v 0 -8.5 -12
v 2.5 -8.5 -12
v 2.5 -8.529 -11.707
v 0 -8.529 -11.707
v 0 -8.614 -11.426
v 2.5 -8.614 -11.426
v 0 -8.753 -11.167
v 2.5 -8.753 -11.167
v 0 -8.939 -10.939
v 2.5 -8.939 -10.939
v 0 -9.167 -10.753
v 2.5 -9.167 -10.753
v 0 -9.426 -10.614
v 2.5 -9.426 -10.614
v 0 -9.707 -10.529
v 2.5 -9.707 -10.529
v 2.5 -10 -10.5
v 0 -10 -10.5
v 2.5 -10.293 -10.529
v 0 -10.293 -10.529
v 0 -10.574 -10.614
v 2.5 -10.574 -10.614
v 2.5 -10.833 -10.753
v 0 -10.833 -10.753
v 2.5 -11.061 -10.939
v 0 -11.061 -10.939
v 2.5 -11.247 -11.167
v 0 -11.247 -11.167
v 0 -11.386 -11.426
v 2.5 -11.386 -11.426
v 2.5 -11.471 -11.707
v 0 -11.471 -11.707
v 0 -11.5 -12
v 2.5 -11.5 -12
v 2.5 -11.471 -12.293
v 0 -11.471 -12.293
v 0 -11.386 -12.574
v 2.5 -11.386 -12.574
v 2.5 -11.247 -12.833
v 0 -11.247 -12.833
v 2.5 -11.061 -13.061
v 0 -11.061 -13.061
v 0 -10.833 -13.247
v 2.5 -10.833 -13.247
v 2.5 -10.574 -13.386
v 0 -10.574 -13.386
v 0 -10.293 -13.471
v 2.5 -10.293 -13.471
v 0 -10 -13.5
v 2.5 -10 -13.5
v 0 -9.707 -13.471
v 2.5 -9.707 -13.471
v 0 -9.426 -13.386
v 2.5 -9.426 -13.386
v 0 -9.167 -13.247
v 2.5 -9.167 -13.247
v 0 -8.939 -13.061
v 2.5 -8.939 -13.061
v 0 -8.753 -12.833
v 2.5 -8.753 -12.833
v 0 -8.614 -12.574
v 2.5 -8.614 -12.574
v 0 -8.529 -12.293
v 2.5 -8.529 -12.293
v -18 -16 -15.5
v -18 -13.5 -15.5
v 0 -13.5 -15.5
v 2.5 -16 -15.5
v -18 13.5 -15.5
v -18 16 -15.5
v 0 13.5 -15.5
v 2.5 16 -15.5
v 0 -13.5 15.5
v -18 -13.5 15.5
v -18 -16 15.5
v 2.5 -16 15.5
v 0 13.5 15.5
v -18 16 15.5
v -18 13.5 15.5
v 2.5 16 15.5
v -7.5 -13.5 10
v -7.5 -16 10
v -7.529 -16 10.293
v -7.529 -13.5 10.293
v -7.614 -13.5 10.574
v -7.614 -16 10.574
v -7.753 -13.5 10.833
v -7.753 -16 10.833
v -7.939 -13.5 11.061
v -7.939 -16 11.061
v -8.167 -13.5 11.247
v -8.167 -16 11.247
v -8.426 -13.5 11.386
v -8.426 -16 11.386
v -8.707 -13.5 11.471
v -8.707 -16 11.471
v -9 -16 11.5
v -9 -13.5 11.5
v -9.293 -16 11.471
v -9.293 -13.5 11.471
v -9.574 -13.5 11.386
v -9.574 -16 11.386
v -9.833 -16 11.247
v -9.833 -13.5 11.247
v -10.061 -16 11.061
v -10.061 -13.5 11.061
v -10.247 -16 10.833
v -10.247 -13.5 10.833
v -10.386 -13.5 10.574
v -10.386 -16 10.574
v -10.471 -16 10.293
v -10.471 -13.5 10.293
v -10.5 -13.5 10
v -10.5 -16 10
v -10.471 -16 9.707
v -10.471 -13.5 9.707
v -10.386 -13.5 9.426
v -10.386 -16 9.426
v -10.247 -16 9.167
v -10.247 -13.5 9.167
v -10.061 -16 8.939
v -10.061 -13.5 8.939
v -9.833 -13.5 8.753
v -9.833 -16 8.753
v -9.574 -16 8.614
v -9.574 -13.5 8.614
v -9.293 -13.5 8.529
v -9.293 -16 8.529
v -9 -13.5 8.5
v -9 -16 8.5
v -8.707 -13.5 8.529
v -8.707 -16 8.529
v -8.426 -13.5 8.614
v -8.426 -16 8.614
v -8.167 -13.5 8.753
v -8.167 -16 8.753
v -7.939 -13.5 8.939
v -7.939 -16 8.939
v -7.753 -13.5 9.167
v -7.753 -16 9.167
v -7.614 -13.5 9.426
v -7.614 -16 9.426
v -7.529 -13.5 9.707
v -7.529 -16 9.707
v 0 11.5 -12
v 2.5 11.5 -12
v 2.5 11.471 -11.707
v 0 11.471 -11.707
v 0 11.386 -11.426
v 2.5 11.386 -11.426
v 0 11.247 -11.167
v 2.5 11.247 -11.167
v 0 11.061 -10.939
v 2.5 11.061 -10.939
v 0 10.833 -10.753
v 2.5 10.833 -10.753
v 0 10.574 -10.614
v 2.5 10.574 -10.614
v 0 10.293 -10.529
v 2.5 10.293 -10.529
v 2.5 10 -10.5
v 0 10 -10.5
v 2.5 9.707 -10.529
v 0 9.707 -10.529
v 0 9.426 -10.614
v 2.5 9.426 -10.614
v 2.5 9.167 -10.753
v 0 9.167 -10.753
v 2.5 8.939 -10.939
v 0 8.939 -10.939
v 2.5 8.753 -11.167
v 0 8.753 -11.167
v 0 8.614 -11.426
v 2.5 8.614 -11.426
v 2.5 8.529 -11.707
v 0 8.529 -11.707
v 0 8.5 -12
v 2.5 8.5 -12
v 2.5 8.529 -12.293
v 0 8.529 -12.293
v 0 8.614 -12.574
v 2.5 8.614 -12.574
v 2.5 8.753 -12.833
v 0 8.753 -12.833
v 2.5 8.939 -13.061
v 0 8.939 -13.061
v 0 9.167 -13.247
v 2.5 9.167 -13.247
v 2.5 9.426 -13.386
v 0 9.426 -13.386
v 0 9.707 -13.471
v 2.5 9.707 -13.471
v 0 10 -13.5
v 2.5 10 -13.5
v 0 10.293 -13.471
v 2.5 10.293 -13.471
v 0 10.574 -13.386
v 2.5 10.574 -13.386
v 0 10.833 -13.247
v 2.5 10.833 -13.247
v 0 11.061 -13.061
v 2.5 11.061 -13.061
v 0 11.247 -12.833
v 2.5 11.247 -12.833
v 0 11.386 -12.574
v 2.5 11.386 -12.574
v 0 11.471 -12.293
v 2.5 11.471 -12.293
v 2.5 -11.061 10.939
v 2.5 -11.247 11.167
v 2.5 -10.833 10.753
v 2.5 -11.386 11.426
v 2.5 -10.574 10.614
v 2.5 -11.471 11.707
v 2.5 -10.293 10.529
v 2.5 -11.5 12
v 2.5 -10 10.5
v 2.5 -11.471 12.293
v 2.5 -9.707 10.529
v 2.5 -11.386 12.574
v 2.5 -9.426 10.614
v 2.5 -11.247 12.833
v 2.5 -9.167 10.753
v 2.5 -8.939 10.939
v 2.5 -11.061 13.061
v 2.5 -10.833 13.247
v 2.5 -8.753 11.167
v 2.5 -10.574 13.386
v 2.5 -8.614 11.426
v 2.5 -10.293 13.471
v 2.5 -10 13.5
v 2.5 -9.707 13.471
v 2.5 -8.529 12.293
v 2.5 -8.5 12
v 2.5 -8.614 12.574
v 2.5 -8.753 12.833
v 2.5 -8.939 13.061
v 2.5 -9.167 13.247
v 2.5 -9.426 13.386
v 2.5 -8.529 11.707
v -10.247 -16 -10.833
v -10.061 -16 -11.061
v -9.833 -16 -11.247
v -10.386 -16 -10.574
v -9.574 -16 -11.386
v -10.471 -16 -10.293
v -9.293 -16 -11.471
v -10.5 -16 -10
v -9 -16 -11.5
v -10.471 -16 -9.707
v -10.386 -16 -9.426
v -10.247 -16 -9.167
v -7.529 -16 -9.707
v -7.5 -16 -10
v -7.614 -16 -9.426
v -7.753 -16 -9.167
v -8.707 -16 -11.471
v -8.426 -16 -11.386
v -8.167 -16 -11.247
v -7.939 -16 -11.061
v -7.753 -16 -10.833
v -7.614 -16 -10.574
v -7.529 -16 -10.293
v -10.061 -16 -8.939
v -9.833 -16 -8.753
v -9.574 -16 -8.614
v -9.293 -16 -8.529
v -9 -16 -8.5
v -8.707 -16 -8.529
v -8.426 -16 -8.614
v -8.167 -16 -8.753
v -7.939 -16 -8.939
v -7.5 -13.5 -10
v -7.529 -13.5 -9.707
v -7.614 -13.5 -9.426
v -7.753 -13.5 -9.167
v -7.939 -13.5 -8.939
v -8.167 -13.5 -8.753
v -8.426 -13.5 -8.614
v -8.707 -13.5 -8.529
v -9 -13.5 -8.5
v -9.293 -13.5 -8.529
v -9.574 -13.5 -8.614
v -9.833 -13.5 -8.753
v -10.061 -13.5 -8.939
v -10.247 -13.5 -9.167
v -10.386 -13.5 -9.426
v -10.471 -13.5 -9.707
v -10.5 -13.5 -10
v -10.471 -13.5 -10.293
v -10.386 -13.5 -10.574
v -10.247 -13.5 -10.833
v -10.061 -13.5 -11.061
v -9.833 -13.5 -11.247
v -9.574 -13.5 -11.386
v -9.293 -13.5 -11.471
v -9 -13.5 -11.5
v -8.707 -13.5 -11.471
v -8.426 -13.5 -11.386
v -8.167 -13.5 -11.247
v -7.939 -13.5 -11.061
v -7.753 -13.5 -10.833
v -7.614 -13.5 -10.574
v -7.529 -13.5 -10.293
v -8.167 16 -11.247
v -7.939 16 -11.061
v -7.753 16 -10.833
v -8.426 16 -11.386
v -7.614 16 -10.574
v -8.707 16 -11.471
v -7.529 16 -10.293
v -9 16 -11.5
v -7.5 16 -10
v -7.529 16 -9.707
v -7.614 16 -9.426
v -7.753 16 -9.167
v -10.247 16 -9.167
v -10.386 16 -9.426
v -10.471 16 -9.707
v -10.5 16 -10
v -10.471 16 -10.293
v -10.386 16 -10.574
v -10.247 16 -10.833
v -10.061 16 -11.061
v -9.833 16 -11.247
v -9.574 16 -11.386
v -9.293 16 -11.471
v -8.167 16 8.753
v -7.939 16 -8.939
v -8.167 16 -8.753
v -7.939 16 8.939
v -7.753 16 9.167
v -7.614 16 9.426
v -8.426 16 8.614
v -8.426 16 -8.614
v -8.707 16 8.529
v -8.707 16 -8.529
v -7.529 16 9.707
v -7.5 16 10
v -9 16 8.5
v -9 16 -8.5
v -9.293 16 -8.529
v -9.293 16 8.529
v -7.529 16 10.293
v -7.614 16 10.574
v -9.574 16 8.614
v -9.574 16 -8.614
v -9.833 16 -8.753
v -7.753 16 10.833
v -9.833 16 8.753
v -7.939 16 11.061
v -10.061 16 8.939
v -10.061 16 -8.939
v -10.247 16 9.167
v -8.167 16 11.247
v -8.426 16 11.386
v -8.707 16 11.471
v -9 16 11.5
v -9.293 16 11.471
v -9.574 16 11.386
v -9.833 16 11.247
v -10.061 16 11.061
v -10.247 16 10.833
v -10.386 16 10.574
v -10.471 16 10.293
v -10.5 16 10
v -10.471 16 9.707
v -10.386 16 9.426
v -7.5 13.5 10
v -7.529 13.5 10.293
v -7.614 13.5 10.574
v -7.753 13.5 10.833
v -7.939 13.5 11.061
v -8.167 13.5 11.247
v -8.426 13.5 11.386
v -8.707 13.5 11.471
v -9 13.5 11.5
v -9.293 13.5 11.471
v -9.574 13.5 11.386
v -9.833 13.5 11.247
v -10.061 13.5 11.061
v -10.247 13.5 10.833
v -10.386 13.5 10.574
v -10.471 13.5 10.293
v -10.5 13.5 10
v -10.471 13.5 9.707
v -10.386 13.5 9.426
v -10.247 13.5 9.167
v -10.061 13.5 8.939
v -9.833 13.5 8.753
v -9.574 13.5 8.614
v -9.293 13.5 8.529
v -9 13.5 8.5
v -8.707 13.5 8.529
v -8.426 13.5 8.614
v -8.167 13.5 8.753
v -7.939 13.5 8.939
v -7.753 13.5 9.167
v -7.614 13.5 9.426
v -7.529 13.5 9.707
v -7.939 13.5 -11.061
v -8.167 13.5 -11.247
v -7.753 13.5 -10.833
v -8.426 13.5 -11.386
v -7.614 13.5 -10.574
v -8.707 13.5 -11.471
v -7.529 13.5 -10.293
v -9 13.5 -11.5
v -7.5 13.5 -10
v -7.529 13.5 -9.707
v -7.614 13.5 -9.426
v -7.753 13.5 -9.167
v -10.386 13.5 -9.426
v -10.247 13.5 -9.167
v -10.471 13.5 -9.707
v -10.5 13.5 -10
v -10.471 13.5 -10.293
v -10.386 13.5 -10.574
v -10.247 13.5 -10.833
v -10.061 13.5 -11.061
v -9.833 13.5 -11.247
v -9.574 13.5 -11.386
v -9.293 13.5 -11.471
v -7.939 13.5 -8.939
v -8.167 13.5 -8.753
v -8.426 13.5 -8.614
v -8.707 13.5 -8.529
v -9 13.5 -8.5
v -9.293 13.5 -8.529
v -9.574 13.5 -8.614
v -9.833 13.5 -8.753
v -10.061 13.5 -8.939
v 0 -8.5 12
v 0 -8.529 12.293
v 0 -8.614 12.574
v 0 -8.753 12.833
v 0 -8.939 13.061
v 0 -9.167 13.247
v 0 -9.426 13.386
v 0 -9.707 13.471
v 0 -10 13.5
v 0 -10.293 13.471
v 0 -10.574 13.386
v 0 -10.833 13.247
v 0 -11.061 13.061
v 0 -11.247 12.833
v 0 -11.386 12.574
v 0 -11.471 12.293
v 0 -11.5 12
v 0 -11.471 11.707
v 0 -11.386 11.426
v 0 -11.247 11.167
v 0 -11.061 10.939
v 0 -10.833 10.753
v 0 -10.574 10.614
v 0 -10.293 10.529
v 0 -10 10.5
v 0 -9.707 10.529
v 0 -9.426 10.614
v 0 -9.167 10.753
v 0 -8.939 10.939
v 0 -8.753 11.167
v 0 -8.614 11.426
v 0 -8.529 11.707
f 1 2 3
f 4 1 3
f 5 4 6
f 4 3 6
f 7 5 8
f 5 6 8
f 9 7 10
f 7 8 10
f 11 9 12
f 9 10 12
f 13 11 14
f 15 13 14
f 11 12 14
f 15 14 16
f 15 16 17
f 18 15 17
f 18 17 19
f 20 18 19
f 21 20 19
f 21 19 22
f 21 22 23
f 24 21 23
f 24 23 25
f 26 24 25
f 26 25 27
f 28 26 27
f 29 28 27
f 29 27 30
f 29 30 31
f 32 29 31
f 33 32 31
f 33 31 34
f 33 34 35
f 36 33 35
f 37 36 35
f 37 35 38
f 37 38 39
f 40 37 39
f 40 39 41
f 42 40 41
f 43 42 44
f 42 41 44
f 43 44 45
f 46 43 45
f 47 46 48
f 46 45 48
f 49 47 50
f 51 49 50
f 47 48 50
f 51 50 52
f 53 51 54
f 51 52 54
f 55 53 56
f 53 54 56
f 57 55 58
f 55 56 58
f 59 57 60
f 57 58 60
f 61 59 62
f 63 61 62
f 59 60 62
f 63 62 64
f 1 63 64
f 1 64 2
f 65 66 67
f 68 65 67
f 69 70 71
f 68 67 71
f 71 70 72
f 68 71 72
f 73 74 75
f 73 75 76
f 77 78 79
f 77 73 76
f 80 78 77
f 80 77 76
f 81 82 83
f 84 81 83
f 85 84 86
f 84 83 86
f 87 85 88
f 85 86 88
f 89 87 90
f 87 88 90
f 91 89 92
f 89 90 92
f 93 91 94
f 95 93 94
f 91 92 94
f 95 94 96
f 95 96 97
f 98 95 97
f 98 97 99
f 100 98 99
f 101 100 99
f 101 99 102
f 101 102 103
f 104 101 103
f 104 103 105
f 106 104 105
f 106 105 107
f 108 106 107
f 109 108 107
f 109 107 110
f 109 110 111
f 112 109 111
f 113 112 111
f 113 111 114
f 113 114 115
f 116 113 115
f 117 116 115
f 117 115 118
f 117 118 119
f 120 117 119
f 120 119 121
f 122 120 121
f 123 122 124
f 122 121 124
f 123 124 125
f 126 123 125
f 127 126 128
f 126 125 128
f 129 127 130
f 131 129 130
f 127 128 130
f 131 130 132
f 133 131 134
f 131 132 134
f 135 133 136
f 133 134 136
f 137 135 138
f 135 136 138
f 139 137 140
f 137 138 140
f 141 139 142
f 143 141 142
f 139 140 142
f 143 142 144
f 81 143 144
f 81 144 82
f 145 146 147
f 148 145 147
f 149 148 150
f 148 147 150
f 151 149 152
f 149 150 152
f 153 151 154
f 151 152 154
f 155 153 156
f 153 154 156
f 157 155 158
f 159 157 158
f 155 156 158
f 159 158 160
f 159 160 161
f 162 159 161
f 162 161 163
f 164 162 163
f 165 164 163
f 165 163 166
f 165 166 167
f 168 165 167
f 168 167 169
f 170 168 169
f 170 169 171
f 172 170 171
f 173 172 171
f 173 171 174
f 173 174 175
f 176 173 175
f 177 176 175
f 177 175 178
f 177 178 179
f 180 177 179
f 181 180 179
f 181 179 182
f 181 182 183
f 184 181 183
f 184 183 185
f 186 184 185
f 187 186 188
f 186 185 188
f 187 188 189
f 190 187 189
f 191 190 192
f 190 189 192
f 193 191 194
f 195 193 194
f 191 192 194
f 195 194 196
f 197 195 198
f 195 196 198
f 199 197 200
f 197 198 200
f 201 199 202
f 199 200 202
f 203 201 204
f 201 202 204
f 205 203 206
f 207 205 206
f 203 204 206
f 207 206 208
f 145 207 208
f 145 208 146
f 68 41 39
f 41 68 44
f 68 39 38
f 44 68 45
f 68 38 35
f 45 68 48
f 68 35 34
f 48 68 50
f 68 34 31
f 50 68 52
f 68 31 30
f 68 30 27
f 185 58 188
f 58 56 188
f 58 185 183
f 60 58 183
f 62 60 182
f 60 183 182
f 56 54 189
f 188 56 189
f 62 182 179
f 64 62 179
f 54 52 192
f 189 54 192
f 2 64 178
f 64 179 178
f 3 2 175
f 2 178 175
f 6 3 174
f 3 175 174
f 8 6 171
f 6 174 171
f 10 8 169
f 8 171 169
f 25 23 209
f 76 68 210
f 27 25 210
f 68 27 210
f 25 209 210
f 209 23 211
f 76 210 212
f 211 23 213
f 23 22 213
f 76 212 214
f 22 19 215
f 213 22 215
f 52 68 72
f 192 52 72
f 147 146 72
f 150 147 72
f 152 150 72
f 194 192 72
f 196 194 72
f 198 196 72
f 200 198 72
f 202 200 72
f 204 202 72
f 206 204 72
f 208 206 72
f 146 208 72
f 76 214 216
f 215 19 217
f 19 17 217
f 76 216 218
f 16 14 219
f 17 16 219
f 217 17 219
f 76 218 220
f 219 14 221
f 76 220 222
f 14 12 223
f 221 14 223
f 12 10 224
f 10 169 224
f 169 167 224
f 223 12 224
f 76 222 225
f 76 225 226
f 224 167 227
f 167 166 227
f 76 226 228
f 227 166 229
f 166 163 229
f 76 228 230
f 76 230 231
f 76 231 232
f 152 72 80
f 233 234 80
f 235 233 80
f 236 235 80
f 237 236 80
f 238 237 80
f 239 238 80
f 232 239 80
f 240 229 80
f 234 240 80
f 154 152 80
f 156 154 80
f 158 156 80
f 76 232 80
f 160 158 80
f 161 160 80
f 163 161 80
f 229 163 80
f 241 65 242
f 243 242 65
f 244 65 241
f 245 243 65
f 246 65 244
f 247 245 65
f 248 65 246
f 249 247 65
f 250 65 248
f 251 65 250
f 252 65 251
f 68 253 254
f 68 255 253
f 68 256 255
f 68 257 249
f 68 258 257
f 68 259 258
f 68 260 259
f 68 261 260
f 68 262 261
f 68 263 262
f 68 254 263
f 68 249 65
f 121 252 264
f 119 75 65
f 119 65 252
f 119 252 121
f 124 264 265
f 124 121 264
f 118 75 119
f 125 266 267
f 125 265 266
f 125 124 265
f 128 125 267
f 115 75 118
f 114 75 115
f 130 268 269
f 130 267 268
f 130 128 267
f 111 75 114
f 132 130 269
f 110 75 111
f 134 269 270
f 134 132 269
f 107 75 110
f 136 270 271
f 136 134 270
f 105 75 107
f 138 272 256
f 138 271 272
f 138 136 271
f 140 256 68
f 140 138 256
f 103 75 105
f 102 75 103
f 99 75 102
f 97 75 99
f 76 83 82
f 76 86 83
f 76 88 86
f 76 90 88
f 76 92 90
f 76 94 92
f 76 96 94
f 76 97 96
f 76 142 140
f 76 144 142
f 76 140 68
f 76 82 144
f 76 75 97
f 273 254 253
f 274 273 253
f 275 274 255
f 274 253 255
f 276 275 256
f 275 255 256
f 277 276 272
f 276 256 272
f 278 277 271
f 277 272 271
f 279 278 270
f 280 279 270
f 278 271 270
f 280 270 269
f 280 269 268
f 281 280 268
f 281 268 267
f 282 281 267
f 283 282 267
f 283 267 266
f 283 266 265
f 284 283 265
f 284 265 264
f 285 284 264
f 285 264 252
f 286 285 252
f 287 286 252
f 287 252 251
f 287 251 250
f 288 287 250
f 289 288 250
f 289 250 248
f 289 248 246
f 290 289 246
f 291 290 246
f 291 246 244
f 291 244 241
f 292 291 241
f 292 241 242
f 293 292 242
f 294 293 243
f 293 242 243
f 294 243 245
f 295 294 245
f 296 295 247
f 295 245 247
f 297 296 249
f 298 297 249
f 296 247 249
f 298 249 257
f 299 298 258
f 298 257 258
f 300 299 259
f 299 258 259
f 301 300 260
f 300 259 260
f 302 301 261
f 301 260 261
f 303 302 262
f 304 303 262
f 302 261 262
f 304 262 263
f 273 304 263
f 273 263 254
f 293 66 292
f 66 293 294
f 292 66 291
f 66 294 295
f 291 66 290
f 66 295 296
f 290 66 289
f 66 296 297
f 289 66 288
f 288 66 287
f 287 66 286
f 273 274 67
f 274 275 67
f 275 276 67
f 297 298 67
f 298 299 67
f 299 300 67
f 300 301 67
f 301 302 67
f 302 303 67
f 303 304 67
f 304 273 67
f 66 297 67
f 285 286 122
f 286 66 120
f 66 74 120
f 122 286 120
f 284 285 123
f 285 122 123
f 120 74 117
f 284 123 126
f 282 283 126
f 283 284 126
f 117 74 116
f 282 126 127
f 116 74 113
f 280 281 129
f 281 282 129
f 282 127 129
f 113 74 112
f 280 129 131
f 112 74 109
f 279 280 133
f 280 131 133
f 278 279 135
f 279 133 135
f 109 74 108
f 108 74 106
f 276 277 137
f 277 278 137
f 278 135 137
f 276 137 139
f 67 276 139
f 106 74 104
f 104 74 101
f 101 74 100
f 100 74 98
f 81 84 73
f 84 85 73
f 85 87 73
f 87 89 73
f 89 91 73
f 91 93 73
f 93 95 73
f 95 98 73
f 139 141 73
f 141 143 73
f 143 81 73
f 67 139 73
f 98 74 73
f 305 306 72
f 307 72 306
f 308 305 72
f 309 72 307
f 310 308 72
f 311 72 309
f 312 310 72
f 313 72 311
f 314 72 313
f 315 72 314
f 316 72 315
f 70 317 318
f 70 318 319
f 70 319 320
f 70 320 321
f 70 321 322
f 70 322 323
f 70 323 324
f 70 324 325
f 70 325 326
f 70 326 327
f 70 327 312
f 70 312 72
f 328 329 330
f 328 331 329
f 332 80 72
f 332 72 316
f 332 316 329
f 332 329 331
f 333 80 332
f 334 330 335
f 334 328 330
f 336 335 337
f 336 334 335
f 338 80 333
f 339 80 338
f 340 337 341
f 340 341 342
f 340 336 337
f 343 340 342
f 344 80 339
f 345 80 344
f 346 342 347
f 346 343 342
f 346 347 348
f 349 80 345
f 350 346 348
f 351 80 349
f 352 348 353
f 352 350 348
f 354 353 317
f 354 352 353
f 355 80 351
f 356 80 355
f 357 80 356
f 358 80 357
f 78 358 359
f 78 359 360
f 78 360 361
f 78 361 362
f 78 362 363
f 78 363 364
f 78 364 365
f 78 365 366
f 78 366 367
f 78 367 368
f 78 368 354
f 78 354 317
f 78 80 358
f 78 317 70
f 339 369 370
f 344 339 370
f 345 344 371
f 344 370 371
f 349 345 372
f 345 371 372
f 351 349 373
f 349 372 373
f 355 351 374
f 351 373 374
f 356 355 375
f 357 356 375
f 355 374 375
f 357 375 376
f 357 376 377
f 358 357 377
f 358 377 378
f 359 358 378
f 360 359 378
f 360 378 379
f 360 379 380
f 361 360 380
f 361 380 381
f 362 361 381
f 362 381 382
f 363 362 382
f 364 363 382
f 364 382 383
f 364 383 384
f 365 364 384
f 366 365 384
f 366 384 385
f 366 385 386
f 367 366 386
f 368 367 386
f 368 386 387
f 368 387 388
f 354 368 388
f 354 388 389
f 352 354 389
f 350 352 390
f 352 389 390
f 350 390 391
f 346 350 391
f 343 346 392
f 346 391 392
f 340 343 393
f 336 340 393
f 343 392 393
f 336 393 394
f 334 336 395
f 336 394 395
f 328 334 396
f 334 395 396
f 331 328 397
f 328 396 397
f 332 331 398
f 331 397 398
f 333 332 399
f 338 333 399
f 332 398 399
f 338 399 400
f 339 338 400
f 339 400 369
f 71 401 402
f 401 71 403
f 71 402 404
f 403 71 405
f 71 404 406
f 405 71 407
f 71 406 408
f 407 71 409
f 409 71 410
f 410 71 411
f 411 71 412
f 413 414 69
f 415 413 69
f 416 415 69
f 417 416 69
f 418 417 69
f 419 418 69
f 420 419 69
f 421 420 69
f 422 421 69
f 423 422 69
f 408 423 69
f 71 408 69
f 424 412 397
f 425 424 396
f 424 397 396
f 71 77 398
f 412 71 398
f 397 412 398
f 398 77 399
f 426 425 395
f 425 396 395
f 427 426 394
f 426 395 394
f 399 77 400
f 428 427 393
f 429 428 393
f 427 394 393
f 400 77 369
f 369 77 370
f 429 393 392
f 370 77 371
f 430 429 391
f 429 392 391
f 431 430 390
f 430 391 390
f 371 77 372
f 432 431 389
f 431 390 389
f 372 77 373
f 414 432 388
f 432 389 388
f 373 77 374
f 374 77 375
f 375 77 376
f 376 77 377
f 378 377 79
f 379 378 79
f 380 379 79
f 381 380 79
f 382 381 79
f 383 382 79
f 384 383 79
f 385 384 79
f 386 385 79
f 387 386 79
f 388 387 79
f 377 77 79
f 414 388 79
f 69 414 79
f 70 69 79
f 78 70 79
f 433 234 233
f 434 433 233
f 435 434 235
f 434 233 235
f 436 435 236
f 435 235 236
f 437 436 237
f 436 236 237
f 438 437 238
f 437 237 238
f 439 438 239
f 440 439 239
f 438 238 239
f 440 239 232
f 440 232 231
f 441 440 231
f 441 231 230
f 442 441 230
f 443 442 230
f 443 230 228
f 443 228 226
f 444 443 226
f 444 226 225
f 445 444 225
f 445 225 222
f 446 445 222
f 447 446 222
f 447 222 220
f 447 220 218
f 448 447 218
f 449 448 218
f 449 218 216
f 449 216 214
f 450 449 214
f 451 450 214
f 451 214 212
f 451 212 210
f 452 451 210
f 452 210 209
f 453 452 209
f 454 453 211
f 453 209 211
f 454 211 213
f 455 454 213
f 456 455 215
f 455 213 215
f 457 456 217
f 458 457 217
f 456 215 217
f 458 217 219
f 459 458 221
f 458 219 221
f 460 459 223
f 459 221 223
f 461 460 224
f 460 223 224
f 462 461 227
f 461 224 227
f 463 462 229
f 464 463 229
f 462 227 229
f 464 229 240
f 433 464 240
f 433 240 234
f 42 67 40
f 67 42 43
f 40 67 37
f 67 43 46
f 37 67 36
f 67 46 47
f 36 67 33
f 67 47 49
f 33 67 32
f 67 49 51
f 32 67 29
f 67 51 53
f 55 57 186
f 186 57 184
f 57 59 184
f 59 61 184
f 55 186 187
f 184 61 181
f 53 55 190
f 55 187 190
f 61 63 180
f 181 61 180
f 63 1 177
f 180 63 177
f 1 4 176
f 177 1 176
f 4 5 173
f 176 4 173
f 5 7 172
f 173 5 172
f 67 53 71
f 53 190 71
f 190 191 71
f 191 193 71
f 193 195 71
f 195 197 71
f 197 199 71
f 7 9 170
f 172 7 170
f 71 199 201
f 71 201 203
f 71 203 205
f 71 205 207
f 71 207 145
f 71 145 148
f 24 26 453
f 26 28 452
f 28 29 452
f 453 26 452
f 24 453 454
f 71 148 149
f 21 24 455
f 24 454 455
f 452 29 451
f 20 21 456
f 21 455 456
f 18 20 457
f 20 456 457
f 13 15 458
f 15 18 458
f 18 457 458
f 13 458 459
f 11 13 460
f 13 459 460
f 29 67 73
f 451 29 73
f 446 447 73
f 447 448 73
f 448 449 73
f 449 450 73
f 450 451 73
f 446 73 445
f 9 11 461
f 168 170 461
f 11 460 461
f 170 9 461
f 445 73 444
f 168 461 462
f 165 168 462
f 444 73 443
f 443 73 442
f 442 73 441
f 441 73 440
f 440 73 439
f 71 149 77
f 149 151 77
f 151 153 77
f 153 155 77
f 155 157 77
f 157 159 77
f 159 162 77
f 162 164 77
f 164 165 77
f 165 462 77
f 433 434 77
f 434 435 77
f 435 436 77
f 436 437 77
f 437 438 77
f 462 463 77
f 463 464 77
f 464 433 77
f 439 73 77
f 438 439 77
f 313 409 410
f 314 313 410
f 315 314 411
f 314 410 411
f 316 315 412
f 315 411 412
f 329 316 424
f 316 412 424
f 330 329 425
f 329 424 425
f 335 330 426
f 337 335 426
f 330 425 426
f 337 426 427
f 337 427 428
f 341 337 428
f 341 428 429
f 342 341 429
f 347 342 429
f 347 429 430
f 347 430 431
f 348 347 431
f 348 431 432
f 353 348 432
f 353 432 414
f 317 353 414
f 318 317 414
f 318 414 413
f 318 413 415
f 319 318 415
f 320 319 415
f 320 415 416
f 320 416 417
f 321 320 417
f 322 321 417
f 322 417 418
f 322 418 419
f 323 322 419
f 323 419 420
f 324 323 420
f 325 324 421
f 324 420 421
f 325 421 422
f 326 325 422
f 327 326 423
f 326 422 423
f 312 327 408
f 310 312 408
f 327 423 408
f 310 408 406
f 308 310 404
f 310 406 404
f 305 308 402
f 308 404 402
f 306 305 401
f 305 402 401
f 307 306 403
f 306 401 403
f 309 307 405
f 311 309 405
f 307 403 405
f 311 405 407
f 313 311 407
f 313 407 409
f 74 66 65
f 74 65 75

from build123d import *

# Parameters (mm, degrees)
F0_W     = 27
F0_H     = 31
F1_DEPTH = 2.5
F2_W     = 20.5
F2_H     = 31
F3_DEPTH = 2.5
F4_W     = 20.5
F4_H     = 31
F5_DEPTH = 2.5
F6_R     = 1.5
F7_DEPTH = 20.501
F8_R     = 1.5
F9_DEPTH = 32.001


with BuildPart() as f1:
    # F0 (on Right) → F1 (new body)
    with BuildSketch(Plane.YZ):
        Rectangle(F0_W, F0_H)
    extrude(amount=F1_DEPTH)

    # F2 (on face) → F3 (join)
    with BuildSketch(Plane(origin=(0, 13.5, 0), x_dir=(-1, 0, 0), z_dir=(0, 1, 0))):
        with Locations((7.75, 0)):
            Rectangle(F2_W, F2_H)
    extrude(amount=F3_DEPTH)

    # F4 (on face) → F5 (join)
    with BuildSketch(Plane.XZ.offset(13.5)):
        with Locations((-7.75, 0)):
            Rectangle(F4_W, F4_H)
    extrude(amount=F5_DEPTH)

    # F6 (on face) → F7 (cut, through all)
    with BuildSketch(Plane.YZ.offset(2.5)):
        with Locations((-10, -12)):
            Circle(F6_R)
        with Locations((-10, 12)):
            Circle(F6_R)
        with Locations((10, -12)):
            Circle(F6_R)
    extrude(amount=-F7_DEPTH, mode=Mode.SUBTRACT)

    # F8 (on face) → F9 (cut, through all)
    with BuildSketch(Plane.XZ.offset(16)):
        with Locations((-9, 10)):
            Circle(F8_R)
        with Locations((-9, -10)):
            Circle(F8_R)
    extrude(amount=-F9_DEPTH, mode=Mode.SUBTRACT)


solid = f1.part
